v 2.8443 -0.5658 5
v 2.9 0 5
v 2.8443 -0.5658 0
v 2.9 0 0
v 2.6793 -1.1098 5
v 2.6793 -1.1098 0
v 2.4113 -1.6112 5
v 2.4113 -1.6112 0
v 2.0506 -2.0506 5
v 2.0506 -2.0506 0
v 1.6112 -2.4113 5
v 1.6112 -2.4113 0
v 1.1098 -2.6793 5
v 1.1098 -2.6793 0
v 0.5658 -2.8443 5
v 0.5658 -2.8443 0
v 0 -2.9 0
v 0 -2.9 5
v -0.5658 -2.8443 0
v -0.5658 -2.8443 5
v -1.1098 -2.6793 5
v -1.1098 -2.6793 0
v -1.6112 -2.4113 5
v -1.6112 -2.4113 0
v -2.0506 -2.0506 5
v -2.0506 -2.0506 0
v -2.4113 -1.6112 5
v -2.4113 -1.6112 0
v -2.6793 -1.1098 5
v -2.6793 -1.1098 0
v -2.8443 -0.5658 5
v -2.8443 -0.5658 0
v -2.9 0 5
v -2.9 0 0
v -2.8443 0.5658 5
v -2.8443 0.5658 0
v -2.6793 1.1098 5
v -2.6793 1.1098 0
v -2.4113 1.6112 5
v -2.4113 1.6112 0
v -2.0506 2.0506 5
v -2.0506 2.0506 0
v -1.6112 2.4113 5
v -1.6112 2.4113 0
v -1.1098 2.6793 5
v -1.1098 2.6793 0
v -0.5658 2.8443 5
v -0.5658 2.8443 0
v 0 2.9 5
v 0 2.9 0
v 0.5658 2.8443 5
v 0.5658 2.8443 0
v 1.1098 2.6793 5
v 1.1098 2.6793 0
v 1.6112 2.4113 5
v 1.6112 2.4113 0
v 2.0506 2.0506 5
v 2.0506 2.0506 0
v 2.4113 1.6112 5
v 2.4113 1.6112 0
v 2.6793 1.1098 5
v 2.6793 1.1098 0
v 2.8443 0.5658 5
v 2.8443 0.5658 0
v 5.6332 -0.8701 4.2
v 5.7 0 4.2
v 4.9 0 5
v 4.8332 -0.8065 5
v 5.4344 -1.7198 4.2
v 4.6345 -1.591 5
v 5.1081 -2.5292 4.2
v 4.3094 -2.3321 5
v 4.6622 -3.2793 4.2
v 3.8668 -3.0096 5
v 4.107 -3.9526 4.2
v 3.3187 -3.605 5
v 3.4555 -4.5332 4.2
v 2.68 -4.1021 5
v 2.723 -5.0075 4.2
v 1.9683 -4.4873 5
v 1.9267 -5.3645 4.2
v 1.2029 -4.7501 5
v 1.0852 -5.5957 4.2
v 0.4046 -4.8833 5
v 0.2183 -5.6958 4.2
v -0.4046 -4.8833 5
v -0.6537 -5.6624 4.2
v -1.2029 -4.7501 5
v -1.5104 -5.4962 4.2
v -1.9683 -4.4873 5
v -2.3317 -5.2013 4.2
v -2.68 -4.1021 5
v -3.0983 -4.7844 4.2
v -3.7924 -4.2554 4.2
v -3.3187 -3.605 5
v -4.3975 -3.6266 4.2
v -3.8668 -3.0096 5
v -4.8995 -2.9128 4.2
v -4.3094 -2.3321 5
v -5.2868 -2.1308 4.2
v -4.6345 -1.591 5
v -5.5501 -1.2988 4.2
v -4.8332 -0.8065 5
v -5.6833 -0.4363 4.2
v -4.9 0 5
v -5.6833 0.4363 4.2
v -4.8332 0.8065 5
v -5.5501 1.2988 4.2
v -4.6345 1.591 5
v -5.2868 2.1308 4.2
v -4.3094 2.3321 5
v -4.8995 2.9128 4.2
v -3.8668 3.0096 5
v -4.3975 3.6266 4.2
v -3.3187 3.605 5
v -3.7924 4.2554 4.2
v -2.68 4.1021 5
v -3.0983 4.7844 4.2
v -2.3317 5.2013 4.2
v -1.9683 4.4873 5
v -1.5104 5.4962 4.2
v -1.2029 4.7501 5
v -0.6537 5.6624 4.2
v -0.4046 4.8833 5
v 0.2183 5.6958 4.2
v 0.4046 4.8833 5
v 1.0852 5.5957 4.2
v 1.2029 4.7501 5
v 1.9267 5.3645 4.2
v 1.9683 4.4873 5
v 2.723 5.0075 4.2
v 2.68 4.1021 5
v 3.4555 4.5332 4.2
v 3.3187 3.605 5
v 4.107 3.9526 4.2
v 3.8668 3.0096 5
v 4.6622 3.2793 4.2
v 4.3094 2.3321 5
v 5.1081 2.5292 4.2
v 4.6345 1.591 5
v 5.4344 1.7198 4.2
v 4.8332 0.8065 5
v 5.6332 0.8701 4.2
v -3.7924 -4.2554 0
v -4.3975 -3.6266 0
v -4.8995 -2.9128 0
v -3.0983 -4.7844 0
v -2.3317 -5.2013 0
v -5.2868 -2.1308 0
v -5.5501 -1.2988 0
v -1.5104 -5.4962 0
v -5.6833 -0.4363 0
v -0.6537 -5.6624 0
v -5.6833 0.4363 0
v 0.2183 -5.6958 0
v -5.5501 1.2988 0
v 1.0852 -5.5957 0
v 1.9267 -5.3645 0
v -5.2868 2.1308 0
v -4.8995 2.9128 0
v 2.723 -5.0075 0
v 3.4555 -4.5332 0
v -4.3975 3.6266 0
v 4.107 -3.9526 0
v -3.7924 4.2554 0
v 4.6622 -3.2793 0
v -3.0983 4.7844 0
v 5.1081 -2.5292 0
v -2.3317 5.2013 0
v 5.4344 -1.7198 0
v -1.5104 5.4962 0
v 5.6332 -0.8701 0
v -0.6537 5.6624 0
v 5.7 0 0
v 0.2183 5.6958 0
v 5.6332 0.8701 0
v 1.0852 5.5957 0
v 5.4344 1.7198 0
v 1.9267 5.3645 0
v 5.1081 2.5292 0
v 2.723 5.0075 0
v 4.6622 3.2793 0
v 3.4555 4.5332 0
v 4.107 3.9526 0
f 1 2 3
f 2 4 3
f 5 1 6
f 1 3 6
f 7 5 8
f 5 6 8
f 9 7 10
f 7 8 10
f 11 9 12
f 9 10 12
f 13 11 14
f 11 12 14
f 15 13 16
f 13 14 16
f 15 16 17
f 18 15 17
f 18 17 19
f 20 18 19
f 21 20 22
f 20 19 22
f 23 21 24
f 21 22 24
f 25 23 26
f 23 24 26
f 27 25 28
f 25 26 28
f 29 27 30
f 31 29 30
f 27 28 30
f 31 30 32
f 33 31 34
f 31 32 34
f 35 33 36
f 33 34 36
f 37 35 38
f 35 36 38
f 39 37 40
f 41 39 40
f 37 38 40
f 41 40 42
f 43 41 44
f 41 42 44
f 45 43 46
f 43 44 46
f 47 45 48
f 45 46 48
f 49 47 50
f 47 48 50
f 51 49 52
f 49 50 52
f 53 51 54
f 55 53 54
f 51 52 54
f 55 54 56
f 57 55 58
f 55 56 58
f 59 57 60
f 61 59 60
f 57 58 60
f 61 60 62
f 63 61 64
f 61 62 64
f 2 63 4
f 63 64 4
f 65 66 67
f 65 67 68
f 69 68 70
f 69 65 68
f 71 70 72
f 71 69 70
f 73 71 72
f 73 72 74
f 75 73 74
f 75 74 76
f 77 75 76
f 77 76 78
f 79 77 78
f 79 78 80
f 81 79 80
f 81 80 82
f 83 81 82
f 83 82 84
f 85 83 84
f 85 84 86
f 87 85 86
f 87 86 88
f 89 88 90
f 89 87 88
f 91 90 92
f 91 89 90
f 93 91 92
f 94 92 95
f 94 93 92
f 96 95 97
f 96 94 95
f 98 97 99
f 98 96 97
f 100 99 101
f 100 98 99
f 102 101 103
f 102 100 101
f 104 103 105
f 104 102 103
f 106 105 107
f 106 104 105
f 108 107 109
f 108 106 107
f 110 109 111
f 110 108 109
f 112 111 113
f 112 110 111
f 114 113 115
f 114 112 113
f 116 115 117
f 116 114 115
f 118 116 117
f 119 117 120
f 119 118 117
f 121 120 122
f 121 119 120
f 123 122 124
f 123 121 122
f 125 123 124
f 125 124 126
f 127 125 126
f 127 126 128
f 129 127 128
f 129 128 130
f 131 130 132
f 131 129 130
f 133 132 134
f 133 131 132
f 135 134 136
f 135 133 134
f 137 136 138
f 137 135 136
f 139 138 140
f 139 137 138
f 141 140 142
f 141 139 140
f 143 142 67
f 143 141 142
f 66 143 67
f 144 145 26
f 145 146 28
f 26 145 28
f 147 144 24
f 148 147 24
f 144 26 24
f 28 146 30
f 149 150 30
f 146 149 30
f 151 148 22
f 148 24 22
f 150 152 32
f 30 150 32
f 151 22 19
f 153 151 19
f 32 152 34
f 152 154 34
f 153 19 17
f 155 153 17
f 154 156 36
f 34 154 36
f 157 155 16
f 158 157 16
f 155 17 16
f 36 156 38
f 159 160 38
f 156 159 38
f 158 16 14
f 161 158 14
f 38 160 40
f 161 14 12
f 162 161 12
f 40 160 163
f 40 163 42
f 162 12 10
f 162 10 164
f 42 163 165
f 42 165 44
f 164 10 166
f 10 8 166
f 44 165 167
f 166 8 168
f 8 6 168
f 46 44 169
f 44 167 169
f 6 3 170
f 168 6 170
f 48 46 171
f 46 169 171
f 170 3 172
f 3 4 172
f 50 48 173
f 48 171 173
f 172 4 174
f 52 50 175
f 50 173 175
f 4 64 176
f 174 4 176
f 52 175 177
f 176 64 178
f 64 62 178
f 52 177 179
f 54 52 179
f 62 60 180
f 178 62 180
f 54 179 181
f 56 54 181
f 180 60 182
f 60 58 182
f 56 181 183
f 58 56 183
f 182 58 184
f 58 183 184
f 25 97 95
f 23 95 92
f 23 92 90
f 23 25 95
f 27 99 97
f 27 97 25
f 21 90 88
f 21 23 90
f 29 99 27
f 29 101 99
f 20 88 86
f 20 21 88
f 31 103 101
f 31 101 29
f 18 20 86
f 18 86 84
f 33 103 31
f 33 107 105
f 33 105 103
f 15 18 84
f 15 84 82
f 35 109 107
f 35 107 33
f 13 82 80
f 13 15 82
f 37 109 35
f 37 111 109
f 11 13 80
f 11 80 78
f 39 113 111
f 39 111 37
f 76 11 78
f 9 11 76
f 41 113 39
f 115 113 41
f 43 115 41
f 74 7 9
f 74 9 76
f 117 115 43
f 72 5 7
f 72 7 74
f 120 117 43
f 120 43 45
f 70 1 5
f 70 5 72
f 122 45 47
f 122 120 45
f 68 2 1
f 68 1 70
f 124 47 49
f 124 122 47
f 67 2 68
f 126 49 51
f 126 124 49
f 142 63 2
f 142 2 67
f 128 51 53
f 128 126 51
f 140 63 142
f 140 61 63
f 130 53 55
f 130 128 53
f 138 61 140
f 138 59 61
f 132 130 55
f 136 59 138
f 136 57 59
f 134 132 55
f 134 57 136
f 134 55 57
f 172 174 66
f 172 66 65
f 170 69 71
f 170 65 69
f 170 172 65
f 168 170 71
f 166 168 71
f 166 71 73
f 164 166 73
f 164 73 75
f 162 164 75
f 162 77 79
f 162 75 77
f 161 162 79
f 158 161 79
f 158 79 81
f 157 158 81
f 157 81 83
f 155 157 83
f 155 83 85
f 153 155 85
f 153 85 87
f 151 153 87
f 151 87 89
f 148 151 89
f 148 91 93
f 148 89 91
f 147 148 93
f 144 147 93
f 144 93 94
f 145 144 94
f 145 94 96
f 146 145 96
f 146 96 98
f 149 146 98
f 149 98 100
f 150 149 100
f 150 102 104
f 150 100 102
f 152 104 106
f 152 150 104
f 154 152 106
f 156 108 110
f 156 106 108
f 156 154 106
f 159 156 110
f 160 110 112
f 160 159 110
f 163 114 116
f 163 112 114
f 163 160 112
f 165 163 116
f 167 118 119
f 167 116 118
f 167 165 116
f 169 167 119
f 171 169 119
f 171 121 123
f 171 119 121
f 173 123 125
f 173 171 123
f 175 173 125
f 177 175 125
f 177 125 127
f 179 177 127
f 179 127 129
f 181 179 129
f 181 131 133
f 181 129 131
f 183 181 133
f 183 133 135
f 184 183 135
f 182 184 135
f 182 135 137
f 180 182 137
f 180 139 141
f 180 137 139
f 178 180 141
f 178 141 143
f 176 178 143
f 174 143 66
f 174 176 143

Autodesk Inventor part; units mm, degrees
ref_plane "YZ Plane" through (0, 0, 0) normal (1, 0, 0) x (0, 1, 0)
ref_plane "XZ Plane" through (0, 0, 0) normal (0, 1, 0) x (-1, 0, 0)
ref_plane "XY Plane" through (0, 0, 0) normal (0, 0, 1) x (1, 0, 0)
sketch "Sketch1" plane through (0, 0, 0) normal (0, 0, 1) x (1, 0, 0)
  circle A0 centre (0, 0) radius 5.7
  dimension "d0" = 11.4
extrude "Extrusion1" add sketch "Sketch1" along normal blind 5
chamfer "Chamfer1" distance 0.8 angle 45 1 edges at (-5.7, 0, 5)
sketch "Sketch2" plane through (0, 0, 0) normal (0, 0, 1) x (1, 0, 0)
  circle A0 centre (0, 0) radius 2.9
  dimension "d6" = 5.8
extrude "Extrusion2" cut sketch "Sketch2" along normal blind 10
properties part number "Insert5mm"
